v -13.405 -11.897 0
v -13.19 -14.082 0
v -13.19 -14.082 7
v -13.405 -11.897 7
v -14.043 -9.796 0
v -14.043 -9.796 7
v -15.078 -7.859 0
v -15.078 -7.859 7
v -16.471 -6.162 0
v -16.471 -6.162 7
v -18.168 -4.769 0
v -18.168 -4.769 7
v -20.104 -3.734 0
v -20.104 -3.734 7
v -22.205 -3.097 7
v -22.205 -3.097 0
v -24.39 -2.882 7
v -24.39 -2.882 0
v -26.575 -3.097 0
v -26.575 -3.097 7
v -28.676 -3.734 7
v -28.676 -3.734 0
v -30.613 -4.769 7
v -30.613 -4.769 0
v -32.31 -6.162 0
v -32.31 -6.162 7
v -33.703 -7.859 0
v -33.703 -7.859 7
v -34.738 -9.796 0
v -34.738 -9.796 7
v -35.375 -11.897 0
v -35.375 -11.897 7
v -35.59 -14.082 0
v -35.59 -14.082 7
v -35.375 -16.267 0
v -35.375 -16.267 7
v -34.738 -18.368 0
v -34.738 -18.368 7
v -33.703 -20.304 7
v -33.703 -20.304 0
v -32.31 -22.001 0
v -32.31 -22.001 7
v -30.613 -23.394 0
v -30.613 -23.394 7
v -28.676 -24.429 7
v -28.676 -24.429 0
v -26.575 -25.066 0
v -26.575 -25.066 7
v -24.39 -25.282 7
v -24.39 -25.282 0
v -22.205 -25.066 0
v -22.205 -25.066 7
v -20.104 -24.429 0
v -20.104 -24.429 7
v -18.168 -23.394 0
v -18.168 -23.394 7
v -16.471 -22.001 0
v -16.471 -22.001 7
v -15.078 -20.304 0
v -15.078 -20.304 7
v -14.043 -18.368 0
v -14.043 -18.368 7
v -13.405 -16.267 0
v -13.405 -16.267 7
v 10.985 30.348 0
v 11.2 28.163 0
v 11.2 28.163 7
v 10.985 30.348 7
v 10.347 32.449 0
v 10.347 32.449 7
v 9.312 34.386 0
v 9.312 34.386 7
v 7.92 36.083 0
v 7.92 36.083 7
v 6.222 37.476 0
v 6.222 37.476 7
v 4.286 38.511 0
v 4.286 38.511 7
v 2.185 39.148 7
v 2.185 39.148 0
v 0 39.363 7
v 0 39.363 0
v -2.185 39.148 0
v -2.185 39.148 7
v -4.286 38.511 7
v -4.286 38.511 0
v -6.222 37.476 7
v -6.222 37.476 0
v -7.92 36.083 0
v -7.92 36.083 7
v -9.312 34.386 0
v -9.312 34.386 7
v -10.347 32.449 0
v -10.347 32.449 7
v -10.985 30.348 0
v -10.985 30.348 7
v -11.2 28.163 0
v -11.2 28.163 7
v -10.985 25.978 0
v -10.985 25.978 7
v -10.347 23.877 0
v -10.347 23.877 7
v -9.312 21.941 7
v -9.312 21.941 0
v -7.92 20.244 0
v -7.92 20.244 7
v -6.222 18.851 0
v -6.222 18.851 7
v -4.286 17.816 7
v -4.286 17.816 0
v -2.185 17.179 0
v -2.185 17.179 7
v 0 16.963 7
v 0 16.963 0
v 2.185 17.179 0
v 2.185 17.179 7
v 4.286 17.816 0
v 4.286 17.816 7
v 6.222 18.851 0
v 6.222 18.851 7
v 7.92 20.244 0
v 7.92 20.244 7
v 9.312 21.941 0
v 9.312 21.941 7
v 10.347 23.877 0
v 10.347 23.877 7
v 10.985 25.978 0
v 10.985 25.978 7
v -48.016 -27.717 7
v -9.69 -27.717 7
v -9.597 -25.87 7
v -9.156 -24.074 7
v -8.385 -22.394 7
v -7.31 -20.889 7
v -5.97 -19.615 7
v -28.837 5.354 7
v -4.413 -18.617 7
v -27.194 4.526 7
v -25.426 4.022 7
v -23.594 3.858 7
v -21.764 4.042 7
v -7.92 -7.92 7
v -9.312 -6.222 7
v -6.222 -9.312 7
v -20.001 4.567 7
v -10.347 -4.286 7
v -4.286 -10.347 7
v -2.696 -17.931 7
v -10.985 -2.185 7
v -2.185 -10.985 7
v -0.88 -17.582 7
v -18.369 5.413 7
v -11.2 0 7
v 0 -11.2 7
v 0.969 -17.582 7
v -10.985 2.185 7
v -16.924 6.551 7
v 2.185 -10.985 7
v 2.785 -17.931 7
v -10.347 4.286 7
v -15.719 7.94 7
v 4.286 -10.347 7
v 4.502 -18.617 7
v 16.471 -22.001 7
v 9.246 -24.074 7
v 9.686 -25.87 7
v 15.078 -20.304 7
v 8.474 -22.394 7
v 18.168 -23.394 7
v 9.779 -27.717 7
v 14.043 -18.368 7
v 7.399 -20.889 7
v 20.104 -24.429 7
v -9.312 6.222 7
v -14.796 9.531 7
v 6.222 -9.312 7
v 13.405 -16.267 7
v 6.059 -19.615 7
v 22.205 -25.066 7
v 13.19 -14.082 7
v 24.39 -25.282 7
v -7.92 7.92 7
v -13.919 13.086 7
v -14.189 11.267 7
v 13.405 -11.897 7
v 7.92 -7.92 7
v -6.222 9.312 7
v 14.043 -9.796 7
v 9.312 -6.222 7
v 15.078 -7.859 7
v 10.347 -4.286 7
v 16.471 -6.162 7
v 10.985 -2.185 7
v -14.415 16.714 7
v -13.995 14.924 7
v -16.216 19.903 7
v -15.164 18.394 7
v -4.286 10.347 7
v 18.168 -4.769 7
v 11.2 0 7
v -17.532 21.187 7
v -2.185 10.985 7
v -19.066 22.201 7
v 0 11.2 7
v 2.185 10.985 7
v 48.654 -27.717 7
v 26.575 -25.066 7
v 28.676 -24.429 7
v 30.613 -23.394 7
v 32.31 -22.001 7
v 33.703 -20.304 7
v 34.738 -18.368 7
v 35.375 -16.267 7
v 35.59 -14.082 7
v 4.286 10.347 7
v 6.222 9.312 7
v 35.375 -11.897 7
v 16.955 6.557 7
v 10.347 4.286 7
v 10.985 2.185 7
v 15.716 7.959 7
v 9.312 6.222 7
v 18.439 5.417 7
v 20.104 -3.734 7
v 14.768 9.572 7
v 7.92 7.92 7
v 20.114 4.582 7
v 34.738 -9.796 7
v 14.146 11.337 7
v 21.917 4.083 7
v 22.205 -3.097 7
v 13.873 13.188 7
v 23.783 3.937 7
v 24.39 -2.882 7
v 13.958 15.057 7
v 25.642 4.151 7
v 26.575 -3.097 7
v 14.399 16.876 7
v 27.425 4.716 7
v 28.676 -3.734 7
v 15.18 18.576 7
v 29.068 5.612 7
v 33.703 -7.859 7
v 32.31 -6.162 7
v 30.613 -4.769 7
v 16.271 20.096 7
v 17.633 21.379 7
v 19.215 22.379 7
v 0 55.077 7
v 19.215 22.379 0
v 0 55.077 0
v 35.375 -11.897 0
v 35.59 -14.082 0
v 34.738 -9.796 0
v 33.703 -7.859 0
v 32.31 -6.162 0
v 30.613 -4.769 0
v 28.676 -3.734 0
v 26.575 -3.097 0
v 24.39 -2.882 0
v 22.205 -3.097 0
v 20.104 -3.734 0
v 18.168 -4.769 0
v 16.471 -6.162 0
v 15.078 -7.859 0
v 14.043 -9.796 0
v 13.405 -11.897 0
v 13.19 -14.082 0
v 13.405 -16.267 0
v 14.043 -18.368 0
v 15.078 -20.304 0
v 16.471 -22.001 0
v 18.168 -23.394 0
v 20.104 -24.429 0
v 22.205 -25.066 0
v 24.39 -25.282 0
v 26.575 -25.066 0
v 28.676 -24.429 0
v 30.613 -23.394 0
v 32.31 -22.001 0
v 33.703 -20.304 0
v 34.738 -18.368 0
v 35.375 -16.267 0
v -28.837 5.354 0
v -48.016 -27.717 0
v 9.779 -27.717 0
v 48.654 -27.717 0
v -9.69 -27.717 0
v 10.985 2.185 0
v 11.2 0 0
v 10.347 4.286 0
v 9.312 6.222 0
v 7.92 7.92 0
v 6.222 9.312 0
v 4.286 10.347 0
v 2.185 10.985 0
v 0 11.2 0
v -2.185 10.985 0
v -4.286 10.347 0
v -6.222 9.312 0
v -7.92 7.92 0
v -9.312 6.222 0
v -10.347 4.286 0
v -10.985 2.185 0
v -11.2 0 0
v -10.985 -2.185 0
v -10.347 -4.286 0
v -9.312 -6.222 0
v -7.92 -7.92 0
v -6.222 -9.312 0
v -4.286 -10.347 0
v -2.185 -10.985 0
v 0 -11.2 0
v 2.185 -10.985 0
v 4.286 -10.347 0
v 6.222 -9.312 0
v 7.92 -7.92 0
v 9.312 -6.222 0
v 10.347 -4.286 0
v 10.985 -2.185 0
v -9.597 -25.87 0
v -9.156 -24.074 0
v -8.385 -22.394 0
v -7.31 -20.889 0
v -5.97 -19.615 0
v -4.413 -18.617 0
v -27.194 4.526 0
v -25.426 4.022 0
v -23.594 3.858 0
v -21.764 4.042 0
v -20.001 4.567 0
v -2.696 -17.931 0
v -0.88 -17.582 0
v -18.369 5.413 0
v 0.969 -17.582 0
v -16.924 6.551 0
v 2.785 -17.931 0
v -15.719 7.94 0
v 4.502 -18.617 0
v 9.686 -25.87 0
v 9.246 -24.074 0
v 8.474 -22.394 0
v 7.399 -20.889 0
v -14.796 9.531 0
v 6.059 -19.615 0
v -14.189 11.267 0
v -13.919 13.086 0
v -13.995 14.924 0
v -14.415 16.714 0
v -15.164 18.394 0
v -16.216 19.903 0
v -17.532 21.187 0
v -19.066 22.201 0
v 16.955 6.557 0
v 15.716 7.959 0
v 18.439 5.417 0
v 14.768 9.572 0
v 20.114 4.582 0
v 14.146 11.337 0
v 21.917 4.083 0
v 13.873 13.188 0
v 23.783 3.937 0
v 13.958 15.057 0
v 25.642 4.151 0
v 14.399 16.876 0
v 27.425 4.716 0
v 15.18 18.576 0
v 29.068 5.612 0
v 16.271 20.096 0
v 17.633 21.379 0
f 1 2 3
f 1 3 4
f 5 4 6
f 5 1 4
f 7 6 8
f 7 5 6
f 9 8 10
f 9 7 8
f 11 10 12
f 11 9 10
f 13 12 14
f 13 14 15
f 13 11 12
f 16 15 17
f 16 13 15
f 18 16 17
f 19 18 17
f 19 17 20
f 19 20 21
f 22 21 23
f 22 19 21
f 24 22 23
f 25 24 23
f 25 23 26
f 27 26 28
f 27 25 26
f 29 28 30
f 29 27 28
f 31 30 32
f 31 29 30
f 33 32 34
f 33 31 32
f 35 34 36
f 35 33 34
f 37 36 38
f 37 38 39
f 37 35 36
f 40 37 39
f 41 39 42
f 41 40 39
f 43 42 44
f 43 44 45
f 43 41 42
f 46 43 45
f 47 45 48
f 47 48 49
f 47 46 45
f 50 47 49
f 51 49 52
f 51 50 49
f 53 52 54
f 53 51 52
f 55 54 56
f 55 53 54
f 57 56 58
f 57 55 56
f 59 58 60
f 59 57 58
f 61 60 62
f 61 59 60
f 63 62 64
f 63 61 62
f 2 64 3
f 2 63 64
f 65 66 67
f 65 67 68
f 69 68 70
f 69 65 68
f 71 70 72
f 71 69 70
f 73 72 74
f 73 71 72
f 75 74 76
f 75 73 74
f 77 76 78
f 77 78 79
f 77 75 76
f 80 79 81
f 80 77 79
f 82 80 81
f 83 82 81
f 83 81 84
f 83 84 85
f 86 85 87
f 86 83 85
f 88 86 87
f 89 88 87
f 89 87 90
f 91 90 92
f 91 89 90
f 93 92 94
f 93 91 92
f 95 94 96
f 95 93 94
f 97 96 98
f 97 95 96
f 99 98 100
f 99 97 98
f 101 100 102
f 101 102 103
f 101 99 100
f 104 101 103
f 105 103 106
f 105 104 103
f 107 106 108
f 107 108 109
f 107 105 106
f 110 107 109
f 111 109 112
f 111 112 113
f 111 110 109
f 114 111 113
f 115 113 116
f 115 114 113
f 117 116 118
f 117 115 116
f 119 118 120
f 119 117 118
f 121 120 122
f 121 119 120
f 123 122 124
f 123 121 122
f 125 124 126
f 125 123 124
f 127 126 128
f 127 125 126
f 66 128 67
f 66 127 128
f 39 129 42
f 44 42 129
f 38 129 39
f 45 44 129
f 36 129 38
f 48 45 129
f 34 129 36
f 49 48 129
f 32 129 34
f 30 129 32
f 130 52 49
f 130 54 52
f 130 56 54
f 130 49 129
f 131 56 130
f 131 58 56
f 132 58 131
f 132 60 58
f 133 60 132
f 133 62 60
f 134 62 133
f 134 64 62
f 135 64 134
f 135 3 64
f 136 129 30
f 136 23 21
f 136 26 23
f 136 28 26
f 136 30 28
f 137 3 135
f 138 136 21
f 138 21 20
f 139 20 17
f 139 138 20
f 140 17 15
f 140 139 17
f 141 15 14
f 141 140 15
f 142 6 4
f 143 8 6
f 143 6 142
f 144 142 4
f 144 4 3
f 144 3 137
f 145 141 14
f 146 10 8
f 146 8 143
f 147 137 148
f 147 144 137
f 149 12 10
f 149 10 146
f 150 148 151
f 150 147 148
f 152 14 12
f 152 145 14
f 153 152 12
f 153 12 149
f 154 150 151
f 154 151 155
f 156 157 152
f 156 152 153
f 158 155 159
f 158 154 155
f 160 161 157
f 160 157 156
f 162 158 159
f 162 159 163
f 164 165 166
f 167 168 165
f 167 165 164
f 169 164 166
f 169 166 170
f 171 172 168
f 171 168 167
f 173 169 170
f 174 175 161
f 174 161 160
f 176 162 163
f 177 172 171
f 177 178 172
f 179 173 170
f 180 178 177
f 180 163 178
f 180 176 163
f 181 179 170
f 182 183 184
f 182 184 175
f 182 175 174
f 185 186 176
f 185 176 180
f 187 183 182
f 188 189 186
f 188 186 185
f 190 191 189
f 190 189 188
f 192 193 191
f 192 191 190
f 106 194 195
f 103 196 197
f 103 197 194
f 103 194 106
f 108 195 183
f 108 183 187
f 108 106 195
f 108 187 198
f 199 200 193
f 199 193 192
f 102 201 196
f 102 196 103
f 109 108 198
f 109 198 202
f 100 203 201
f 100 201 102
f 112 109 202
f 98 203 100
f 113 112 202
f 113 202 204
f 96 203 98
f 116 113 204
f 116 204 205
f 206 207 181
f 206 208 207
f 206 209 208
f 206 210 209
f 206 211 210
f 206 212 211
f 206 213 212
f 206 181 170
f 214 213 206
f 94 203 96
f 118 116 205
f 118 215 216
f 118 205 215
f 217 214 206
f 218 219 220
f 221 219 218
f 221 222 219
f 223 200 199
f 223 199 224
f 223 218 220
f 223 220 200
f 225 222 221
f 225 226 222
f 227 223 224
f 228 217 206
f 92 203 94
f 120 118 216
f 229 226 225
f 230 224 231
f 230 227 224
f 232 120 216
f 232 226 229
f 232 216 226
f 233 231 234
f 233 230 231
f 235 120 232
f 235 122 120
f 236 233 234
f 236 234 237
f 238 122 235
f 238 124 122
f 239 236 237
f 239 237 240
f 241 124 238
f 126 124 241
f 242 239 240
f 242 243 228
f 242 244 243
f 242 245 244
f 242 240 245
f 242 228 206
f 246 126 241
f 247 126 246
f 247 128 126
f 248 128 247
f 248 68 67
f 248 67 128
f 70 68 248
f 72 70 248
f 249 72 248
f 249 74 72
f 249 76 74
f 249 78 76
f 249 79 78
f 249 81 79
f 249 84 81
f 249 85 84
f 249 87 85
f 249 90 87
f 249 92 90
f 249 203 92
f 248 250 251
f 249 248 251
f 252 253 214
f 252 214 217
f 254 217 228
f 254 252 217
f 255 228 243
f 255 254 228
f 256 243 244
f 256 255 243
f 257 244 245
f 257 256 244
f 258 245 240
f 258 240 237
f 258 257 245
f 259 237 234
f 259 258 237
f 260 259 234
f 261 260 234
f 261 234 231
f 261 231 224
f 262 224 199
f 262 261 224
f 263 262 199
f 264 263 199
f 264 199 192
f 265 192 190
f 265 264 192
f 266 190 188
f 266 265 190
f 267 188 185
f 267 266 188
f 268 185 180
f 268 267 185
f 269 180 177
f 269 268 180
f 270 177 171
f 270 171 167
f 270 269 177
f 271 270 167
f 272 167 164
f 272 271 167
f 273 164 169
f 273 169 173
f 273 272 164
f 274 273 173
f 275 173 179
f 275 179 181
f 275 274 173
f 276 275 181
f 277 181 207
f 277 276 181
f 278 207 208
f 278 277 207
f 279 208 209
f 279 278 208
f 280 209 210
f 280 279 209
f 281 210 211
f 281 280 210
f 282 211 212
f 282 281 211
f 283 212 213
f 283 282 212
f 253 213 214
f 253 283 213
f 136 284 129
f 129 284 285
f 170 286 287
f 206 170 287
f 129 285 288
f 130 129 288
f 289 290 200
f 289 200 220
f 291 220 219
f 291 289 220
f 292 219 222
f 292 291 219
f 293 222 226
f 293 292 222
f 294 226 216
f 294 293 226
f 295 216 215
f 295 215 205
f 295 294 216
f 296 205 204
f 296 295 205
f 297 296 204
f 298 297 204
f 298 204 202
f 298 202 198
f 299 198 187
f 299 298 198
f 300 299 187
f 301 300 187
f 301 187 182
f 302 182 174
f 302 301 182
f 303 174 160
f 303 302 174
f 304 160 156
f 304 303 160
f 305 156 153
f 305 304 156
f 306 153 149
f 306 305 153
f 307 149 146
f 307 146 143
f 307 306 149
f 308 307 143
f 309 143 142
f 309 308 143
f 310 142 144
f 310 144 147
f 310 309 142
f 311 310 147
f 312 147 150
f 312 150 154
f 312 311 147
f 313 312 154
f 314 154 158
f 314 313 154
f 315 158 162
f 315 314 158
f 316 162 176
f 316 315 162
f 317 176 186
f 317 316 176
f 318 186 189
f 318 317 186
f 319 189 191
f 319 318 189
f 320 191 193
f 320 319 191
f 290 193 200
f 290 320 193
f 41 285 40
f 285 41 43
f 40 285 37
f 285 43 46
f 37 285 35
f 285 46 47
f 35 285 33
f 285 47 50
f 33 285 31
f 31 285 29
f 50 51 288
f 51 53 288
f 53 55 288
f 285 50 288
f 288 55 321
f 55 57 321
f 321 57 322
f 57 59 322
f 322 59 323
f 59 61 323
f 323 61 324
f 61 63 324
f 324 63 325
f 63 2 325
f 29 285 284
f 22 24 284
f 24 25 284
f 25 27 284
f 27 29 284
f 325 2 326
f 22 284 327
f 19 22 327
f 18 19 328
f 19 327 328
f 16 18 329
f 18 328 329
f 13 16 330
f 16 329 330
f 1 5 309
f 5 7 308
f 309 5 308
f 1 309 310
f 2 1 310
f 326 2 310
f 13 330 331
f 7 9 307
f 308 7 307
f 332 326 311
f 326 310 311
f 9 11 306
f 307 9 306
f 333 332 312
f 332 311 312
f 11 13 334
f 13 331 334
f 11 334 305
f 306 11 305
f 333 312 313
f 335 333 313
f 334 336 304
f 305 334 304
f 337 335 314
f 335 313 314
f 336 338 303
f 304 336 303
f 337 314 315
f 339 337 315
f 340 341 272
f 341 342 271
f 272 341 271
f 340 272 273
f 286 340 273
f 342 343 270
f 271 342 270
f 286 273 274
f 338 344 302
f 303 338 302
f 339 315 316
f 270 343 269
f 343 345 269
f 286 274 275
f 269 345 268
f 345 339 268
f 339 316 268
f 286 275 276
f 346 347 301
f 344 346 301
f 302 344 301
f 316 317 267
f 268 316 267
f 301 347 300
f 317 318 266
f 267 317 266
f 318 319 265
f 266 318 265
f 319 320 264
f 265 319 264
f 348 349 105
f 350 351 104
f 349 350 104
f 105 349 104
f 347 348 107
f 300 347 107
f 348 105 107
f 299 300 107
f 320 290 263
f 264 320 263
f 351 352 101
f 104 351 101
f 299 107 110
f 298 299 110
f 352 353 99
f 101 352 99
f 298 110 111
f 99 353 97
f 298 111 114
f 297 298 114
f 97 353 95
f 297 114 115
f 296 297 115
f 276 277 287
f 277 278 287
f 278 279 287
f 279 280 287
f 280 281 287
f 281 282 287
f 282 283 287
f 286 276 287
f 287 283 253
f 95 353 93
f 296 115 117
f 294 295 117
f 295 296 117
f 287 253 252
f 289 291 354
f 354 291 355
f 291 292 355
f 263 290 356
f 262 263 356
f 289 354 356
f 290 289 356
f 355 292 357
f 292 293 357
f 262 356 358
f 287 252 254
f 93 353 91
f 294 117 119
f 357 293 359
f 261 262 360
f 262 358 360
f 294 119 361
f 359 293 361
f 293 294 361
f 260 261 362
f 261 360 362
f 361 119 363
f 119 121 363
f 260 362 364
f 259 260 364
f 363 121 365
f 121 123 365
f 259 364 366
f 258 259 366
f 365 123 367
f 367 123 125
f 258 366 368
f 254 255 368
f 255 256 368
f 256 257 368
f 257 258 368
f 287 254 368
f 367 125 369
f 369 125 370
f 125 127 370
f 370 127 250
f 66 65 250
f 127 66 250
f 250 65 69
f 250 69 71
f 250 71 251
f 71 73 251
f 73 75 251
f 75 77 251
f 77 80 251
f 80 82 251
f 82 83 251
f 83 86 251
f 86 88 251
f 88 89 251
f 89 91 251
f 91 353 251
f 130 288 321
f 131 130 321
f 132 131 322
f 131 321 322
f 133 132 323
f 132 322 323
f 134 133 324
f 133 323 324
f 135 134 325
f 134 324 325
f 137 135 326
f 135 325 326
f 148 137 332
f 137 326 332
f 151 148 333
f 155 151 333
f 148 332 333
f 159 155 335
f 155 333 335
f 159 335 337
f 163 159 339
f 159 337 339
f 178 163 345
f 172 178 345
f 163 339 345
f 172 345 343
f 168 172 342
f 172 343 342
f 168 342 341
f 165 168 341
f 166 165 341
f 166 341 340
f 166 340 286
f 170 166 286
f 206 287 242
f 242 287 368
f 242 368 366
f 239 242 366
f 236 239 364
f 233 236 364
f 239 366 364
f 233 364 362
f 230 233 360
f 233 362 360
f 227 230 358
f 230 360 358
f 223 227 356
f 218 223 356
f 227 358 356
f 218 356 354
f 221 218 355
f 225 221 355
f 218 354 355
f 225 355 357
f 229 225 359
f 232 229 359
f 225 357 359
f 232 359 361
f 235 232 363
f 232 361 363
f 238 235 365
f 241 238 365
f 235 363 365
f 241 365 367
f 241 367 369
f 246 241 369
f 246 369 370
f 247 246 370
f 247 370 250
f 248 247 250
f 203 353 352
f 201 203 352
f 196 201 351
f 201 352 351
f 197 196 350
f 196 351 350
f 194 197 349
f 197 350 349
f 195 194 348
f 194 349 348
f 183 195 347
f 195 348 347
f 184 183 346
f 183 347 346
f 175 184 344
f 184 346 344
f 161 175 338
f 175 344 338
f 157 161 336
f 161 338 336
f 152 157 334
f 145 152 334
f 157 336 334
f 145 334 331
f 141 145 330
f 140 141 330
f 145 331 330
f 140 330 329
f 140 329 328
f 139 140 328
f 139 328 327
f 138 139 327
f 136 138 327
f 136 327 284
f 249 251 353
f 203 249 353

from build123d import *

# Parameters (mm, degrees)
F0_R     = 11.2
F1_DEPTH = 7


with BuildPart() as f1:
    # F0 (on Top) → F1 (new body)
    with BuildSketch(Plane.XY):
        with BuildLine():
            Line((19.215132, 22.378807), (0, 55.077419))
            Line((0, 55.077419), (-19.066227, 22.201317))
            ThreePointArc((-19.066227, 22.201317), (-15.219751, 8.713844), (-28.836632, 5.354102))
            Line((-28.836632, 5.354102), (-48.016034, -27.717147))
            Line((-48.016034, -27.717147), (-9.689672, -27.717147))
            ThreePointArc((-9.689672, -27.717147), (0.044547, -17.537595), (9.778766, -27.717147))
            Line((9.778766, -27.717147), (48.653703, -27.717147))
            Line((48.653703, -27.717147), (29.068287, 5.61158))
            ThreePointArc((29.068287, 5.61158), (15.203422, 8.742665), (19.215132, 22.378807))
        make_face()
        with Locations((-24.390228, -14.081704)):
            Circle(F0_R, mode=Mode.SUBTRACT)
        Circle(F0_R, mode=Mode.SUBTRACT)
        with Locations((24.390229, -14.081704)):
            Circle(F0_R, mode=Mode.SUBTRACT)
        with Locations((0, 28.163411)):
            Circle(F0_R, mode=Mode.SUBTRACT)
    extrude(amount=F1_DEPTH)


solid = f1.part
